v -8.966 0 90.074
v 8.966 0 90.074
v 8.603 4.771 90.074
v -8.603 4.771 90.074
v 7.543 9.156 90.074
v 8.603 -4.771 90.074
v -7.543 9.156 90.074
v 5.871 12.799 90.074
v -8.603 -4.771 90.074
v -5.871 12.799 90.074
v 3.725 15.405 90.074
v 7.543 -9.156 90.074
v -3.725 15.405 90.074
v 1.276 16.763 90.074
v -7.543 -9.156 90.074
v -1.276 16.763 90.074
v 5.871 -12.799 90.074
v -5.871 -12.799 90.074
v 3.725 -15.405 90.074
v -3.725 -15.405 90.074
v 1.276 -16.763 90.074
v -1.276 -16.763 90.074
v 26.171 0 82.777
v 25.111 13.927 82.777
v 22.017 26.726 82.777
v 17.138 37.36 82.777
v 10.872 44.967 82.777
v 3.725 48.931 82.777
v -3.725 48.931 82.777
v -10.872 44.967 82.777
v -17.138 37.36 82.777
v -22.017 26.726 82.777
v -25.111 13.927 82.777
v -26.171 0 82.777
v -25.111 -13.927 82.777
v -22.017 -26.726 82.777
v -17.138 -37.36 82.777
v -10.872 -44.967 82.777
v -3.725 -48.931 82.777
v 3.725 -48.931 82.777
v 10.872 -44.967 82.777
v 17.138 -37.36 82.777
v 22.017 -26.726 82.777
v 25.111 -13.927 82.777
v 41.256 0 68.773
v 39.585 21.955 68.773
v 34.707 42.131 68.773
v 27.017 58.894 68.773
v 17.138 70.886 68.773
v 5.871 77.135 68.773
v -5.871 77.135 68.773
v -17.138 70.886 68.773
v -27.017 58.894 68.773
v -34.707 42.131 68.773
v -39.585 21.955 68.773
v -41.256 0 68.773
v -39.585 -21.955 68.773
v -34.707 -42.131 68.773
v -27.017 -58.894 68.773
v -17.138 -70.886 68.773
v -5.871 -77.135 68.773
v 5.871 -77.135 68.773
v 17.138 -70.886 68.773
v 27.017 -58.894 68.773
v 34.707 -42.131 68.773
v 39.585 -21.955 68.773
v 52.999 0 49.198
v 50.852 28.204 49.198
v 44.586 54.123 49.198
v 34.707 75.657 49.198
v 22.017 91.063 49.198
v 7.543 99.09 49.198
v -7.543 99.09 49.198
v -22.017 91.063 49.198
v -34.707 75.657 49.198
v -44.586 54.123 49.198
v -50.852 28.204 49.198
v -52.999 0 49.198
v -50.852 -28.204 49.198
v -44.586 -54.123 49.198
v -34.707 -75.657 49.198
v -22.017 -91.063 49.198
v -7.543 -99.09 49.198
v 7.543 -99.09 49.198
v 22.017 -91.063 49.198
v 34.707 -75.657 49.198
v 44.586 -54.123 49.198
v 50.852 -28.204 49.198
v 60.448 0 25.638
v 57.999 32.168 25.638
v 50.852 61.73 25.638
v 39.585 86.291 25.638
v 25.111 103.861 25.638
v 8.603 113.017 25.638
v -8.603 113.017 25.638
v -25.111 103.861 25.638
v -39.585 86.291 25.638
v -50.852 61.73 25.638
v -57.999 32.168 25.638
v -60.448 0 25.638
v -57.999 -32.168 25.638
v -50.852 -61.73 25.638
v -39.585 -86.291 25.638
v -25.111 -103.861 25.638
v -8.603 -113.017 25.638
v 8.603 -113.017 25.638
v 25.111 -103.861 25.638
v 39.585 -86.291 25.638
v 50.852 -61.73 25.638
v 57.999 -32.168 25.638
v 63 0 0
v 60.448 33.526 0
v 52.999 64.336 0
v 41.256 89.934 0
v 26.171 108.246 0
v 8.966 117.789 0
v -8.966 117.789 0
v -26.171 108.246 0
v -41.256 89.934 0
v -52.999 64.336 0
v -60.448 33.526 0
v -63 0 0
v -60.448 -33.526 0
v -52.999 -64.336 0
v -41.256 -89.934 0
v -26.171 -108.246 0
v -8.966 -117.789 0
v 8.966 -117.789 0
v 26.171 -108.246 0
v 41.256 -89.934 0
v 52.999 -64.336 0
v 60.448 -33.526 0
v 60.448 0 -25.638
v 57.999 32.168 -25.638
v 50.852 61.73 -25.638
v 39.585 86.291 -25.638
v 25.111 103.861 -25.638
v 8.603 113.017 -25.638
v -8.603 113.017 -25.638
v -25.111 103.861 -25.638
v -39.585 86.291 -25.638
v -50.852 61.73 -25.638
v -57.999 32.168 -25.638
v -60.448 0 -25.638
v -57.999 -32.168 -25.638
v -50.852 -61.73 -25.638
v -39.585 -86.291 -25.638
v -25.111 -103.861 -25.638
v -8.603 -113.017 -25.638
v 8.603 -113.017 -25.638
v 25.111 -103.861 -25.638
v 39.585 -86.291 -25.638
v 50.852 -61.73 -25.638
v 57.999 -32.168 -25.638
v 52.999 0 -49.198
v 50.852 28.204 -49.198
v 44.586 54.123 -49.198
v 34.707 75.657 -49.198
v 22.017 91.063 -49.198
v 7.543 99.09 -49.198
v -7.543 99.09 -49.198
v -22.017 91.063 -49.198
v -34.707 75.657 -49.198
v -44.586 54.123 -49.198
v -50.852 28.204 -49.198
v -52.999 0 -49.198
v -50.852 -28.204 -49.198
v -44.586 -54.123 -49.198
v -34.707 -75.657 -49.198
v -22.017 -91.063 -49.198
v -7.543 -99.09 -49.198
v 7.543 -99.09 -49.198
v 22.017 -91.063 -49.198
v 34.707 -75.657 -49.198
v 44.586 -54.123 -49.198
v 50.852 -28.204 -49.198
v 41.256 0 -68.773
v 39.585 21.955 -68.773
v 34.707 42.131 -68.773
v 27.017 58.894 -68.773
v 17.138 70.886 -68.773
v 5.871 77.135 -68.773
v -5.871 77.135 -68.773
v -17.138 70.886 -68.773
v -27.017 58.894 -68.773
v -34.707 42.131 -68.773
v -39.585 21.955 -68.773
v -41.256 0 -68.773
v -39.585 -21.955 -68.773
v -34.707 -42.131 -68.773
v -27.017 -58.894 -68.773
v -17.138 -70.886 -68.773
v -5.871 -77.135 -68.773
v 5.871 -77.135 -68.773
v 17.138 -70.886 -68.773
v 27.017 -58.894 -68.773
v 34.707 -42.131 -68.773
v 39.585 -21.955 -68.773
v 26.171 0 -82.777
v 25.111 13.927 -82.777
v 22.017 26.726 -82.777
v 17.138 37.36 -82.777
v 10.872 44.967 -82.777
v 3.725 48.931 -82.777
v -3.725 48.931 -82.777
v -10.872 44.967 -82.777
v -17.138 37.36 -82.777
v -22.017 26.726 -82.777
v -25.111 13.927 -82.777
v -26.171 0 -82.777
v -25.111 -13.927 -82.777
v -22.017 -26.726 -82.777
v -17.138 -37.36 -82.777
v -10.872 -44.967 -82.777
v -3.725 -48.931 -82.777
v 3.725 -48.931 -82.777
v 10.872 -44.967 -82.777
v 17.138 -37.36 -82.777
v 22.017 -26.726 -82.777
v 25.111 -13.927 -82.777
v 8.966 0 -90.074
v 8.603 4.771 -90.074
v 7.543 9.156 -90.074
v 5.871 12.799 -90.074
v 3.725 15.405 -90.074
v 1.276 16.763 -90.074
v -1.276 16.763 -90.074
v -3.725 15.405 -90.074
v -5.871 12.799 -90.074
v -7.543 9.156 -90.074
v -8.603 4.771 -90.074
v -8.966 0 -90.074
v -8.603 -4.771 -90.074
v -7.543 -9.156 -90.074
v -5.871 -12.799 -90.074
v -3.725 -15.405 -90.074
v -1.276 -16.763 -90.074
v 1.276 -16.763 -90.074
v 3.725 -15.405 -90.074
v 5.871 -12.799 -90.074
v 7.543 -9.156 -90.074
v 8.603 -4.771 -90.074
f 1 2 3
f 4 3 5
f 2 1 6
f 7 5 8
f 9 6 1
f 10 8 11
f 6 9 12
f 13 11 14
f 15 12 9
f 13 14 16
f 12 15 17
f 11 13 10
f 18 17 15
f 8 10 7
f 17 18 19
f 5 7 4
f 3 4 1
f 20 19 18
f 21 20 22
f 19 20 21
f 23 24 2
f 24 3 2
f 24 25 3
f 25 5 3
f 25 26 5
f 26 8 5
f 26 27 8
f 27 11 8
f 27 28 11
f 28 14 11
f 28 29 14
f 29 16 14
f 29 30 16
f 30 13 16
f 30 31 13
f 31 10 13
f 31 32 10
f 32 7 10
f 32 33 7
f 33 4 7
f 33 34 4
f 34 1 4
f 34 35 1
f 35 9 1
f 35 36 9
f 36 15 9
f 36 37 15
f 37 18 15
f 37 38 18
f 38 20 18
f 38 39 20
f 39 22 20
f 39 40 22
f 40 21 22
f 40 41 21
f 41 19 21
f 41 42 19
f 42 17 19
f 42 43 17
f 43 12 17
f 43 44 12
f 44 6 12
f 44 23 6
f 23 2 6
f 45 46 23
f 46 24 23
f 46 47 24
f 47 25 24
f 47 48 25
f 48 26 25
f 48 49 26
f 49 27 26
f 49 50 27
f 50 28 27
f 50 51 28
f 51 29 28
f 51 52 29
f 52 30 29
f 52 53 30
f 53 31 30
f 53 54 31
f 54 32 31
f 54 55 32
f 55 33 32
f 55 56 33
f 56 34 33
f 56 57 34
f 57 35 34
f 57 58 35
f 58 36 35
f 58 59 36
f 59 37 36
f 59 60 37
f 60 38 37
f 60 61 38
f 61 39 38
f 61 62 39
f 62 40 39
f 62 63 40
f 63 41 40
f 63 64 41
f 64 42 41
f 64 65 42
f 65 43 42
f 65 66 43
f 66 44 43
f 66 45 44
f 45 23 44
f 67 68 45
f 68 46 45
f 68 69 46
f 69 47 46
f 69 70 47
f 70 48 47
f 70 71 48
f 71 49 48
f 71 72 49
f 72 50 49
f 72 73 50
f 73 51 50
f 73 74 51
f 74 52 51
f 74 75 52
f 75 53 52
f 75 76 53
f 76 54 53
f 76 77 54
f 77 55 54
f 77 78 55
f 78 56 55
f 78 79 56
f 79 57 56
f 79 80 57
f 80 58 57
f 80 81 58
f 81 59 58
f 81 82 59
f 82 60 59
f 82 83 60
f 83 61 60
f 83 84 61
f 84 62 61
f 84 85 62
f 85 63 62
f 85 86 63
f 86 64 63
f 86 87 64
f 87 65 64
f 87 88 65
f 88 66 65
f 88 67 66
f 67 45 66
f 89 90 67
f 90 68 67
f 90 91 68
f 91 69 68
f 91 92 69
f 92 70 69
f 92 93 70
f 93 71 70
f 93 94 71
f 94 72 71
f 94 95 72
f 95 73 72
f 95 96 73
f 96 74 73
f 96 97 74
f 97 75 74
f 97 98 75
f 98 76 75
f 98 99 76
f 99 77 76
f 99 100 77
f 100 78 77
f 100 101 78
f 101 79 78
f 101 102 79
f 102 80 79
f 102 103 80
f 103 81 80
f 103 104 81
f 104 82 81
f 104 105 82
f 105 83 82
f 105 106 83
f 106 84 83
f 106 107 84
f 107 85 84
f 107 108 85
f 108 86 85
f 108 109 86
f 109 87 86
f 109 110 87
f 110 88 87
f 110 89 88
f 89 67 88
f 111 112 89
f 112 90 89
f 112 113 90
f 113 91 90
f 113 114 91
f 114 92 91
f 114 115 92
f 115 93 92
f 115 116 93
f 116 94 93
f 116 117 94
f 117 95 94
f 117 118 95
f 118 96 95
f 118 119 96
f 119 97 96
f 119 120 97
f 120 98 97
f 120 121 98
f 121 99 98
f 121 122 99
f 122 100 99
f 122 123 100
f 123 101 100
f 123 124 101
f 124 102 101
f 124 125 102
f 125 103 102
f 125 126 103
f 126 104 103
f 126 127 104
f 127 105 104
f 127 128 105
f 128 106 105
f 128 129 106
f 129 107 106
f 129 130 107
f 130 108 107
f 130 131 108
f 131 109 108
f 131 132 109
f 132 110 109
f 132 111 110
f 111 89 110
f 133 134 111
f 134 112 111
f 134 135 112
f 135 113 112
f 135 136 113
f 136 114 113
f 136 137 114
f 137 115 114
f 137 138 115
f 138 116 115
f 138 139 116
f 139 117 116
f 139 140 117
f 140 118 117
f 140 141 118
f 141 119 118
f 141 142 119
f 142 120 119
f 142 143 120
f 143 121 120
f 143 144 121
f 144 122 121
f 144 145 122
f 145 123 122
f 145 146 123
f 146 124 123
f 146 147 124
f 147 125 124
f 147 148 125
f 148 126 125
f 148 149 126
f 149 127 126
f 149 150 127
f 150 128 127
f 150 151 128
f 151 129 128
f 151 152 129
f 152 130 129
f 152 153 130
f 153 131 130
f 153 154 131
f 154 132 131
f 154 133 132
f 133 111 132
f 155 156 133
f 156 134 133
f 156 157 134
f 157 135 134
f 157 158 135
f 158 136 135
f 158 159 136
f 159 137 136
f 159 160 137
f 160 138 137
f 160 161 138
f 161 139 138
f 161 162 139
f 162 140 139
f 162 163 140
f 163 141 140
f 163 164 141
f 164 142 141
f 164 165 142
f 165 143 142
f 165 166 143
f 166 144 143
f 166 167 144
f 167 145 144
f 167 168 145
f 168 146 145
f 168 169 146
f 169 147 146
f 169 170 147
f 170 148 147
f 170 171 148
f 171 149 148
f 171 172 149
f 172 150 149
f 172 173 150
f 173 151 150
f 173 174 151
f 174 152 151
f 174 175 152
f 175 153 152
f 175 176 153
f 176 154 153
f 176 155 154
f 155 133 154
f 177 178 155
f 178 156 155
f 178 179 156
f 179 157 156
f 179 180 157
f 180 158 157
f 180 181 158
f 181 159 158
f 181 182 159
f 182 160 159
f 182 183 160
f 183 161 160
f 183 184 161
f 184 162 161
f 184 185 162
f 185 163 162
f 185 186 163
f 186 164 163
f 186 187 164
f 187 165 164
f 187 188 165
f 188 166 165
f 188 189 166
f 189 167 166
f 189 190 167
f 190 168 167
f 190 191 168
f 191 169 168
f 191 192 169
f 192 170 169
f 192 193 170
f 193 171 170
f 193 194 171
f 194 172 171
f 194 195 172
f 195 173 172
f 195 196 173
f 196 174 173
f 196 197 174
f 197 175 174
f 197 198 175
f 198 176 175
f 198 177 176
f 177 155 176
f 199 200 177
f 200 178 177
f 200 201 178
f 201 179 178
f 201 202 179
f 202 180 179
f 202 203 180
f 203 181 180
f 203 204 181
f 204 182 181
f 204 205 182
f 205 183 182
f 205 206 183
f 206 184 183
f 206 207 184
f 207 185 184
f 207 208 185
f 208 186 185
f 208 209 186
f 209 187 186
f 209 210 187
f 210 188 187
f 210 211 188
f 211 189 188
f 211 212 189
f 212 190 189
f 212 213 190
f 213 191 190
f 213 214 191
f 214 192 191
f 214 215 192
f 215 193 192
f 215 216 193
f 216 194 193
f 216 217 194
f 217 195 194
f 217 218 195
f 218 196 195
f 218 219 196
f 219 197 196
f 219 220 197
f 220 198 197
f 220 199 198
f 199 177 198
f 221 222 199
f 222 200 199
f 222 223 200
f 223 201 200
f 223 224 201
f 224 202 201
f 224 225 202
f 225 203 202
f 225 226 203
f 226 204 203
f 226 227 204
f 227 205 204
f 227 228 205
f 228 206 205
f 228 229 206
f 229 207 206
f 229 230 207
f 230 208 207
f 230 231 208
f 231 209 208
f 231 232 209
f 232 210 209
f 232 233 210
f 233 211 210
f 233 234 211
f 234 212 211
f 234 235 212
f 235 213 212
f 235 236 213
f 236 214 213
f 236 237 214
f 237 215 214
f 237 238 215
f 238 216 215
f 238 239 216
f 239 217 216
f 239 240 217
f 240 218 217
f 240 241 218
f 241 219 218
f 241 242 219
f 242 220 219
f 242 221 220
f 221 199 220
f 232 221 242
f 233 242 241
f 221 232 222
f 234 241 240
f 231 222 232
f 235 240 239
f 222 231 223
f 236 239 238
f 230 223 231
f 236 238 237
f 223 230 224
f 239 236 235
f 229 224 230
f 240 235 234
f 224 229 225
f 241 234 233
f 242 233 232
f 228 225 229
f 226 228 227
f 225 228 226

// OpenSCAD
// Generated by SolidPython 1.0.1 on 2020-07-29 00:46:49


scale(v = [9, 17, 13]) {
	sphere(r = 7);
}
/***********************************************
*********      SolidPython code:      **********
************************************************
 
# import packages: SolidPython
from solid import *
from solid.utils import *
from itertools import chain, combinations, permutations


class Resize:

    def __init__(self, scad_file):
        self.scad_file = scad_file
        #self.scad_file = import_scad(scad_file)
        # cone/cylinder param:
        self.r1 = 0
        self.r2 = 0
        self.h = 0
        # rectangular prism param:
        self.w = 0
        self.l = 0
        # ellipse param:
        self.r = 0

    # import OpenScad code (file name corresponds to shape)


    # classify shape + parameters
    def assign(self, param1, param2, param3):
        if self.scad_file == 'cone.scad':
            self.r1 = param1
            self.r2 = param2
            self.h = param3
        elif self.scad_file == 'cylinder.scad':
            self.r1 = param1
            self.r2 = param2
            self.h = param3
        elif self.scad_file == 'rectangularPrism.scad':
            self.h = param1
            self.l = param2
            self.w = param3
        else:
            self.r = param1
            self.h = param2

    # resize parameters
    def iterate(self):
        x = range(3, 20, 2)
        i = 1
        if self.scad_file == 'cone.scad':
            tempList = list(permutations(x, 2))
            for temp in tempList:
                param1 = temp[0]
                param2 = temp[1]
                filepath = 'produced_scad_files/' + 'cone' + str(param1) + '_' + str(param2) + '_' + '.scad'
                scad_render_to_file(cylinder(h=param1, r1=param2, r2=0), filepath)

        elif self.scad_file == 'cylinder.scad':
            tempList = list(permutations(x, 3))
            for temp in tempList:
                param1 = temp[0]
                param2 = temp[1]
                filepath = 'produced_scad_files/' + 'cylinder' + str(param1) + '_' + str(param2) + '_' + '.scad'
                scad_render_to_file(cylinder(h=param1, r1=param2, r2=param2), filepath)

        elif self.scad_file == 'rectangularPrism.scad':
            tempList = list(permutations(x, 3))
            for temp in tempList:
                param1 = temp[0]
                param2 = temp[1]
                param3 = temp[2]
                filepath = 'produced_scad_files/' + 'rectangularPrism' + str(param1) + '_' + str(param2) + '_' + str(
                    param3) + '.scad'
                scad_render_to_file(cube(size=(param1, param2, param3)), filepath)

        elif self.scad_file == 'ellipse.scad':
            tempList = list(permutations(x, 4))
            for temp in tempList:
                param1 = temp[0]
                param2 = temp[1]
                param3 = temp[2]
                param4 = temp[3]
                filepath = 'produced_scad_files/' + 'ellipse' + str(param1) + '_' + str(param2) + '_' + str(param3) + '_' + str(param4) + '.scad'
                scad_render_to_file(scale([param1, param2, param3])(sphere(r=param4)), filepath)

    def render_to_scadfile(self):
        scad_render_to_file(scad, 'example.scad') 
 
************************************************/
